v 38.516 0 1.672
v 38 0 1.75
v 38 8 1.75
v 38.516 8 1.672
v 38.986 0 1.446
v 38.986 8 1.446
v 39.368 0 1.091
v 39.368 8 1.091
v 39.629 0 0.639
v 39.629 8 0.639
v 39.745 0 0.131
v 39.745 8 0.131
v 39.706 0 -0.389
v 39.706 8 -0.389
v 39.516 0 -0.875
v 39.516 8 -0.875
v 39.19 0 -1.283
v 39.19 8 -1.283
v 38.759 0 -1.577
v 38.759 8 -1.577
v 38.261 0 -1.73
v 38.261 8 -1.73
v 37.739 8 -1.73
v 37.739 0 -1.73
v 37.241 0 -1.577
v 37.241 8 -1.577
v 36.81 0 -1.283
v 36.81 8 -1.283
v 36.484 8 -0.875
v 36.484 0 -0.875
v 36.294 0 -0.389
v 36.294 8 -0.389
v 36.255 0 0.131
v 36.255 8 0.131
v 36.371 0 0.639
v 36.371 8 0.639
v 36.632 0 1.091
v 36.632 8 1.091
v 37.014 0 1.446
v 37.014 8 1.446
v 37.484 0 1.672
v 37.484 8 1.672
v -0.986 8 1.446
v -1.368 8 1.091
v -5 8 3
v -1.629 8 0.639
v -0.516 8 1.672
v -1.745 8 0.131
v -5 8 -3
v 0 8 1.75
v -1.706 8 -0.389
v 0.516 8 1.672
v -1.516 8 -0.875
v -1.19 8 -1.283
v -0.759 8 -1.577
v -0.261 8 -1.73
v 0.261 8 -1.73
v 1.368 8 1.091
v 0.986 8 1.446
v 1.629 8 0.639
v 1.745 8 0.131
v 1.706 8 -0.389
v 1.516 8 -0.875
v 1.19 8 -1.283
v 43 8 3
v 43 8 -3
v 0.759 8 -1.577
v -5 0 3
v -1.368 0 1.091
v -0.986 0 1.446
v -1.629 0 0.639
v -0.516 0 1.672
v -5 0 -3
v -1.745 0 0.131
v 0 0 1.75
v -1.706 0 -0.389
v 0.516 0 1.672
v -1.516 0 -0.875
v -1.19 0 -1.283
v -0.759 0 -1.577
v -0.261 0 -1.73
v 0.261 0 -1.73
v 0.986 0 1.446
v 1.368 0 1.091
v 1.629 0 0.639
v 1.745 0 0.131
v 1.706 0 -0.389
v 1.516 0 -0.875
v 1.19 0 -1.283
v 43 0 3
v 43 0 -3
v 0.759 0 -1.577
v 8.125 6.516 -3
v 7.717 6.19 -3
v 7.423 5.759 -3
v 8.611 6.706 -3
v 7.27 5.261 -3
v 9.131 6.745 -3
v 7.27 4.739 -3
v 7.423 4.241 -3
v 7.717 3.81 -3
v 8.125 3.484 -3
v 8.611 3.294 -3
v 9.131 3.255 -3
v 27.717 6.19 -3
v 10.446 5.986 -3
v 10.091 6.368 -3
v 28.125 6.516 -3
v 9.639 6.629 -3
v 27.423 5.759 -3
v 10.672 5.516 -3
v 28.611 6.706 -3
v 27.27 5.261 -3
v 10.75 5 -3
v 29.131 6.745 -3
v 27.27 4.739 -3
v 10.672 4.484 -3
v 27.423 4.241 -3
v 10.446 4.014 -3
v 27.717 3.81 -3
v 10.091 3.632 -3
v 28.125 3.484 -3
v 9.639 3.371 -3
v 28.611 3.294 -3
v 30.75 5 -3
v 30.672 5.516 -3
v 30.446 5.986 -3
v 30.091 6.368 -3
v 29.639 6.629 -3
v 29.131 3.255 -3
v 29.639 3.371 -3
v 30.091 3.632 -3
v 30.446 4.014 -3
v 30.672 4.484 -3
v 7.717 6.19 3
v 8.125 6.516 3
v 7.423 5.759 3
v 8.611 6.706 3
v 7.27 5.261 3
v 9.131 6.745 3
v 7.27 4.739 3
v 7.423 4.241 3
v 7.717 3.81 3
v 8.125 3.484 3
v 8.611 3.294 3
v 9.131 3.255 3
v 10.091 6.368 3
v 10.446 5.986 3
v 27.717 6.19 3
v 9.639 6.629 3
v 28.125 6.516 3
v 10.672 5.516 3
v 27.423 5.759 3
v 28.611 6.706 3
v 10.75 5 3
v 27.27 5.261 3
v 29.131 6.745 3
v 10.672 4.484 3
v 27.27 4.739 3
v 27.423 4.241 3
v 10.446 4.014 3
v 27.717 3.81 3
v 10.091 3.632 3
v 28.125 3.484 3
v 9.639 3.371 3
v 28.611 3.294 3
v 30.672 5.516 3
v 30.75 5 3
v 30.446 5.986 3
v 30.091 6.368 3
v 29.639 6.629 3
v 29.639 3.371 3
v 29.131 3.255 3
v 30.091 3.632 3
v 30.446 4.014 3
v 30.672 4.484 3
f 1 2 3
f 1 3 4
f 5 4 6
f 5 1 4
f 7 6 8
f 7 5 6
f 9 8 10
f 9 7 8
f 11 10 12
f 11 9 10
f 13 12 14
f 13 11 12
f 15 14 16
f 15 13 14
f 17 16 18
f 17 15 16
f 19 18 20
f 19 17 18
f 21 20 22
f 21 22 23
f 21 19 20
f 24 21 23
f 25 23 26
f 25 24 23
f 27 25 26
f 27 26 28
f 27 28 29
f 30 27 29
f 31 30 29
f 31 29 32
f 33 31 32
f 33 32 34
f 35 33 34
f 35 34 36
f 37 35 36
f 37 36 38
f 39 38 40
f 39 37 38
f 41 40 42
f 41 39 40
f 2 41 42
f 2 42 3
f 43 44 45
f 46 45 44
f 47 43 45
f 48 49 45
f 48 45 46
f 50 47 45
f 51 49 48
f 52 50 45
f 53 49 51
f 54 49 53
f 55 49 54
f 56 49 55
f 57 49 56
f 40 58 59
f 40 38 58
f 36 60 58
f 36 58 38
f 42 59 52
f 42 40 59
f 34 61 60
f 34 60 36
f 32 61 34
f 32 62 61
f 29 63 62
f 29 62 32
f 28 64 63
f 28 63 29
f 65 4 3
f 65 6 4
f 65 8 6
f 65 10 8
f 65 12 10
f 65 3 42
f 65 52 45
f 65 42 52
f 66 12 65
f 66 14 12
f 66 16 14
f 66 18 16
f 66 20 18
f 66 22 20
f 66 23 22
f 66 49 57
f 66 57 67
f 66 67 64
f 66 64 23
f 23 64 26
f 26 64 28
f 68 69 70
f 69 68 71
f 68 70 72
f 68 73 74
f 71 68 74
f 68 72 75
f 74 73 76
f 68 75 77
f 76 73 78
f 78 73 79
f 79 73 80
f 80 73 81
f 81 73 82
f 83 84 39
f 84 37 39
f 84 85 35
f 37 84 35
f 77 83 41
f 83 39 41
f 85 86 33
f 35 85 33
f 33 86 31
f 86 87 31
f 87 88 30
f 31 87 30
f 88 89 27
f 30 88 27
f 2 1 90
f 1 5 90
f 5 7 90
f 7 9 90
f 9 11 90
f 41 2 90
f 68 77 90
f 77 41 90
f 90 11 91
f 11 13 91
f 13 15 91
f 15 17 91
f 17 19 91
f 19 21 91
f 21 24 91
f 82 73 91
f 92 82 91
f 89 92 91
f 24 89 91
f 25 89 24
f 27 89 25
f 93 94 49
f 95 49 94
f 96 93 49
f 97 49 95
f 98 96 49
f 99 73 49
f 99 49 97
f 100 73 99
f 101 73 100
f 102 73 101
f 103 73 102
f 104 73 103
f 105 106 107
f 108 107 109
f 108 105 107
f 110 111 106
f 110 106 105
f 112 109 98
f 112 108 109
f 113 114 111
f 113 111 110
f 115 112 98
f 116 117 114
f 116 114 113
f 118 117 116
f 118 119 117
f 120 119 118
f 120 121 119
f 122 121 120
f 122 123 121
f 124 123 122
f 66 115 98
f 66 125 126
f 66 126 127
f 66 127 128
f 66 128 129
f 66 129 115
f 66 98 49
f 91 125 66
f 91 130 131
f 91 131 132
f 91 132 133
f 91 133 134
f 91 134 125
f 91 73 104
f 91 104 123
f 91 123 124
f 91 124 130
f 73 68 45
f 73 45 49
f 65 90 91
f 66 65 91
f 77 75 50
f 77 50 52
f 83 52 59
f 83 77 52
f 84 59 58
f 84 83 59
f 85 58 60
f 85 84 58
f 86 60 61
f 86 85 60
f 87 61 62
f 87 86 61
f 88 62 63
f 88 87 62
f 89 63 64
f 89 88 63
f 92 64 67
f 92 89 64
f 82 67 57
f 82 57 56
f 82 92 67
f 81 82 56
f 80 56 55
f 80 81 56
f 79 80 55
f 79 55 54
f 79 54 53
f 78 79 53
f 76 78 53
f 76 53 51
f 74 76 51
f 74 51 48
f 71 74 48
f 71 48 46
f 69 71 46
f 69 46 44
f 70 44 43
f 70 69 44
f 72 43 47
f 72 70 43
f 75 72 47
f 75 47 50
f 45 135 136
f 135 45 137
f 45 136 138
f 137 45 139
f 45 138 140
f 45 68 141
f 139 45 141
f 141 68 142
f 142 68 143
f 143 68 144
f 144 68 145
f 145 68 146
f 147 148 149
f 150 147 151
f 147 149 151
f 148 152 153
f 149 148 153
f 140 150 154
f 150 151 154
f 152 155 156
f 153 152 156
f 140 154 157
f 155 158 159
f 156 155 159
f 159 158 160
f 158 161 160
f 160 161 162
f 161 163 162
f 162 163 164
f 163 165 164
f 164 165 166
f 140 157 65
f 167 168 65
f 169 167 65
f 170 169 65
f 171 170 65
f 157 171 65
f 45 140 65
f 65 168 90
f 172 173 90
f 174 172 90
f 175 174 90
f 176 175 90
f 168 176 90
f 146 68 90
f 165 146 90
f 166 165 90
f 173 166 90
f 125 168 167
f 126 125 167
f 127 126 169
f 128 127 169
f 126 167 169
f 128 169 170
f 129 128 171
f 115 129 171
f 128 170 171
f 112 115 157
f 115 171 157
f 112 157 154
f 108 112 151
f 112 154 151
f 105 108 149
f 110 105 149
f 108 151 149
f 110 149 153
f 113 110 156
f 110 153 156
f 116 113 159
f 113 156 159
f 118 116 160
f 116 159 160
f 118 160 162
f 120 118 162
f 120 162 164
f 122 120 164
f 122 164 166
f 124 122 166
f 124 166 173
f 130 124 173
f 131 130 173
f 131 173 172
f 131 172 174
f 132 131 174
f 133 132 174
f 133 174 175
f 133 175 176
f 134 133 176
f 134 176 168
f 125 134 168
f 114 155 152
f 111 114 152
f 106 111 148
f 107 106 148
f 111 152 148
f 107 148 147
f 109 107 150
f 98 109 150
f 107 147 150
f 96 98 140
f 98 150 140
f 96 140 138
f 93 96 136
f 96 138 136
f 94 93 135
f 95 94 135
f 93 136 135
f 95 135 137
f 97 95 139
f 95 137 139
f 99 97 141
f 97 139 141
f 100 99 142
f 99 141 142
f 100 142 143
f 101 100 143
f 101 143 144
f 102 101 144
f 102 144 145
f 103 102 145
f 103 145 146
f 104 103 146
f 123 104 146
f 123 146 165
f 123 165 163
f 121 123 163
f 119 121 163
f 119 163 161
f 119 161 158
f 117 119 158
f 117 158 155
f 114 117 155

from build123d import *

# Parameters (mm, degrees)
SKETCH_1_W          = 48
SKETCH_1_H          = 6
SKETCH_1_R          = 1.75
EXTRUDE_1_DEPTH     = 8
SKETCH_2_R          = 1.75
CUT_EXTRUDE_1_DEPTH = 45.147480109


with BuildPart() as part:
    # 草图1 → 凸台-拉伸1 (new body)
    with BuildSketch(Plane(origin=(0, 0, 0), x_dir=(1, 0, 0), z_dir=(0, 1, 0))):
        with Locations((19, 0)):
            Rectangle(SKETCH_1_W, SKETCH_1_H)
        with Locations(Location((0, 0, 0), (0, 0, 270))):
            Circle(SKETCH_1_R, mode=Mode.SUBTRACT)
        with Locations(Location((38, 0, 0), (0, 0, 270))):
            Circle(SKETCH_1_R, mode=Mode.SUBTRACT)
    extrude(amount=EXTRUDE_1_DEPTH)

    # 草图2 → 切除-拉伸1 (cut, through all)
    with BuildSketch(Plane.XY.offset(3)):
        with Locations((9, 5)):
            Circle(SKETCH_2_R)
        with Locations((29, 5)):
            Circle(SKETCH_2_R)
    extrude(amount=-CUT_EXTRUDE_1_DEPTH, mode=Mode.SUBTRACT)


solid = part.part
